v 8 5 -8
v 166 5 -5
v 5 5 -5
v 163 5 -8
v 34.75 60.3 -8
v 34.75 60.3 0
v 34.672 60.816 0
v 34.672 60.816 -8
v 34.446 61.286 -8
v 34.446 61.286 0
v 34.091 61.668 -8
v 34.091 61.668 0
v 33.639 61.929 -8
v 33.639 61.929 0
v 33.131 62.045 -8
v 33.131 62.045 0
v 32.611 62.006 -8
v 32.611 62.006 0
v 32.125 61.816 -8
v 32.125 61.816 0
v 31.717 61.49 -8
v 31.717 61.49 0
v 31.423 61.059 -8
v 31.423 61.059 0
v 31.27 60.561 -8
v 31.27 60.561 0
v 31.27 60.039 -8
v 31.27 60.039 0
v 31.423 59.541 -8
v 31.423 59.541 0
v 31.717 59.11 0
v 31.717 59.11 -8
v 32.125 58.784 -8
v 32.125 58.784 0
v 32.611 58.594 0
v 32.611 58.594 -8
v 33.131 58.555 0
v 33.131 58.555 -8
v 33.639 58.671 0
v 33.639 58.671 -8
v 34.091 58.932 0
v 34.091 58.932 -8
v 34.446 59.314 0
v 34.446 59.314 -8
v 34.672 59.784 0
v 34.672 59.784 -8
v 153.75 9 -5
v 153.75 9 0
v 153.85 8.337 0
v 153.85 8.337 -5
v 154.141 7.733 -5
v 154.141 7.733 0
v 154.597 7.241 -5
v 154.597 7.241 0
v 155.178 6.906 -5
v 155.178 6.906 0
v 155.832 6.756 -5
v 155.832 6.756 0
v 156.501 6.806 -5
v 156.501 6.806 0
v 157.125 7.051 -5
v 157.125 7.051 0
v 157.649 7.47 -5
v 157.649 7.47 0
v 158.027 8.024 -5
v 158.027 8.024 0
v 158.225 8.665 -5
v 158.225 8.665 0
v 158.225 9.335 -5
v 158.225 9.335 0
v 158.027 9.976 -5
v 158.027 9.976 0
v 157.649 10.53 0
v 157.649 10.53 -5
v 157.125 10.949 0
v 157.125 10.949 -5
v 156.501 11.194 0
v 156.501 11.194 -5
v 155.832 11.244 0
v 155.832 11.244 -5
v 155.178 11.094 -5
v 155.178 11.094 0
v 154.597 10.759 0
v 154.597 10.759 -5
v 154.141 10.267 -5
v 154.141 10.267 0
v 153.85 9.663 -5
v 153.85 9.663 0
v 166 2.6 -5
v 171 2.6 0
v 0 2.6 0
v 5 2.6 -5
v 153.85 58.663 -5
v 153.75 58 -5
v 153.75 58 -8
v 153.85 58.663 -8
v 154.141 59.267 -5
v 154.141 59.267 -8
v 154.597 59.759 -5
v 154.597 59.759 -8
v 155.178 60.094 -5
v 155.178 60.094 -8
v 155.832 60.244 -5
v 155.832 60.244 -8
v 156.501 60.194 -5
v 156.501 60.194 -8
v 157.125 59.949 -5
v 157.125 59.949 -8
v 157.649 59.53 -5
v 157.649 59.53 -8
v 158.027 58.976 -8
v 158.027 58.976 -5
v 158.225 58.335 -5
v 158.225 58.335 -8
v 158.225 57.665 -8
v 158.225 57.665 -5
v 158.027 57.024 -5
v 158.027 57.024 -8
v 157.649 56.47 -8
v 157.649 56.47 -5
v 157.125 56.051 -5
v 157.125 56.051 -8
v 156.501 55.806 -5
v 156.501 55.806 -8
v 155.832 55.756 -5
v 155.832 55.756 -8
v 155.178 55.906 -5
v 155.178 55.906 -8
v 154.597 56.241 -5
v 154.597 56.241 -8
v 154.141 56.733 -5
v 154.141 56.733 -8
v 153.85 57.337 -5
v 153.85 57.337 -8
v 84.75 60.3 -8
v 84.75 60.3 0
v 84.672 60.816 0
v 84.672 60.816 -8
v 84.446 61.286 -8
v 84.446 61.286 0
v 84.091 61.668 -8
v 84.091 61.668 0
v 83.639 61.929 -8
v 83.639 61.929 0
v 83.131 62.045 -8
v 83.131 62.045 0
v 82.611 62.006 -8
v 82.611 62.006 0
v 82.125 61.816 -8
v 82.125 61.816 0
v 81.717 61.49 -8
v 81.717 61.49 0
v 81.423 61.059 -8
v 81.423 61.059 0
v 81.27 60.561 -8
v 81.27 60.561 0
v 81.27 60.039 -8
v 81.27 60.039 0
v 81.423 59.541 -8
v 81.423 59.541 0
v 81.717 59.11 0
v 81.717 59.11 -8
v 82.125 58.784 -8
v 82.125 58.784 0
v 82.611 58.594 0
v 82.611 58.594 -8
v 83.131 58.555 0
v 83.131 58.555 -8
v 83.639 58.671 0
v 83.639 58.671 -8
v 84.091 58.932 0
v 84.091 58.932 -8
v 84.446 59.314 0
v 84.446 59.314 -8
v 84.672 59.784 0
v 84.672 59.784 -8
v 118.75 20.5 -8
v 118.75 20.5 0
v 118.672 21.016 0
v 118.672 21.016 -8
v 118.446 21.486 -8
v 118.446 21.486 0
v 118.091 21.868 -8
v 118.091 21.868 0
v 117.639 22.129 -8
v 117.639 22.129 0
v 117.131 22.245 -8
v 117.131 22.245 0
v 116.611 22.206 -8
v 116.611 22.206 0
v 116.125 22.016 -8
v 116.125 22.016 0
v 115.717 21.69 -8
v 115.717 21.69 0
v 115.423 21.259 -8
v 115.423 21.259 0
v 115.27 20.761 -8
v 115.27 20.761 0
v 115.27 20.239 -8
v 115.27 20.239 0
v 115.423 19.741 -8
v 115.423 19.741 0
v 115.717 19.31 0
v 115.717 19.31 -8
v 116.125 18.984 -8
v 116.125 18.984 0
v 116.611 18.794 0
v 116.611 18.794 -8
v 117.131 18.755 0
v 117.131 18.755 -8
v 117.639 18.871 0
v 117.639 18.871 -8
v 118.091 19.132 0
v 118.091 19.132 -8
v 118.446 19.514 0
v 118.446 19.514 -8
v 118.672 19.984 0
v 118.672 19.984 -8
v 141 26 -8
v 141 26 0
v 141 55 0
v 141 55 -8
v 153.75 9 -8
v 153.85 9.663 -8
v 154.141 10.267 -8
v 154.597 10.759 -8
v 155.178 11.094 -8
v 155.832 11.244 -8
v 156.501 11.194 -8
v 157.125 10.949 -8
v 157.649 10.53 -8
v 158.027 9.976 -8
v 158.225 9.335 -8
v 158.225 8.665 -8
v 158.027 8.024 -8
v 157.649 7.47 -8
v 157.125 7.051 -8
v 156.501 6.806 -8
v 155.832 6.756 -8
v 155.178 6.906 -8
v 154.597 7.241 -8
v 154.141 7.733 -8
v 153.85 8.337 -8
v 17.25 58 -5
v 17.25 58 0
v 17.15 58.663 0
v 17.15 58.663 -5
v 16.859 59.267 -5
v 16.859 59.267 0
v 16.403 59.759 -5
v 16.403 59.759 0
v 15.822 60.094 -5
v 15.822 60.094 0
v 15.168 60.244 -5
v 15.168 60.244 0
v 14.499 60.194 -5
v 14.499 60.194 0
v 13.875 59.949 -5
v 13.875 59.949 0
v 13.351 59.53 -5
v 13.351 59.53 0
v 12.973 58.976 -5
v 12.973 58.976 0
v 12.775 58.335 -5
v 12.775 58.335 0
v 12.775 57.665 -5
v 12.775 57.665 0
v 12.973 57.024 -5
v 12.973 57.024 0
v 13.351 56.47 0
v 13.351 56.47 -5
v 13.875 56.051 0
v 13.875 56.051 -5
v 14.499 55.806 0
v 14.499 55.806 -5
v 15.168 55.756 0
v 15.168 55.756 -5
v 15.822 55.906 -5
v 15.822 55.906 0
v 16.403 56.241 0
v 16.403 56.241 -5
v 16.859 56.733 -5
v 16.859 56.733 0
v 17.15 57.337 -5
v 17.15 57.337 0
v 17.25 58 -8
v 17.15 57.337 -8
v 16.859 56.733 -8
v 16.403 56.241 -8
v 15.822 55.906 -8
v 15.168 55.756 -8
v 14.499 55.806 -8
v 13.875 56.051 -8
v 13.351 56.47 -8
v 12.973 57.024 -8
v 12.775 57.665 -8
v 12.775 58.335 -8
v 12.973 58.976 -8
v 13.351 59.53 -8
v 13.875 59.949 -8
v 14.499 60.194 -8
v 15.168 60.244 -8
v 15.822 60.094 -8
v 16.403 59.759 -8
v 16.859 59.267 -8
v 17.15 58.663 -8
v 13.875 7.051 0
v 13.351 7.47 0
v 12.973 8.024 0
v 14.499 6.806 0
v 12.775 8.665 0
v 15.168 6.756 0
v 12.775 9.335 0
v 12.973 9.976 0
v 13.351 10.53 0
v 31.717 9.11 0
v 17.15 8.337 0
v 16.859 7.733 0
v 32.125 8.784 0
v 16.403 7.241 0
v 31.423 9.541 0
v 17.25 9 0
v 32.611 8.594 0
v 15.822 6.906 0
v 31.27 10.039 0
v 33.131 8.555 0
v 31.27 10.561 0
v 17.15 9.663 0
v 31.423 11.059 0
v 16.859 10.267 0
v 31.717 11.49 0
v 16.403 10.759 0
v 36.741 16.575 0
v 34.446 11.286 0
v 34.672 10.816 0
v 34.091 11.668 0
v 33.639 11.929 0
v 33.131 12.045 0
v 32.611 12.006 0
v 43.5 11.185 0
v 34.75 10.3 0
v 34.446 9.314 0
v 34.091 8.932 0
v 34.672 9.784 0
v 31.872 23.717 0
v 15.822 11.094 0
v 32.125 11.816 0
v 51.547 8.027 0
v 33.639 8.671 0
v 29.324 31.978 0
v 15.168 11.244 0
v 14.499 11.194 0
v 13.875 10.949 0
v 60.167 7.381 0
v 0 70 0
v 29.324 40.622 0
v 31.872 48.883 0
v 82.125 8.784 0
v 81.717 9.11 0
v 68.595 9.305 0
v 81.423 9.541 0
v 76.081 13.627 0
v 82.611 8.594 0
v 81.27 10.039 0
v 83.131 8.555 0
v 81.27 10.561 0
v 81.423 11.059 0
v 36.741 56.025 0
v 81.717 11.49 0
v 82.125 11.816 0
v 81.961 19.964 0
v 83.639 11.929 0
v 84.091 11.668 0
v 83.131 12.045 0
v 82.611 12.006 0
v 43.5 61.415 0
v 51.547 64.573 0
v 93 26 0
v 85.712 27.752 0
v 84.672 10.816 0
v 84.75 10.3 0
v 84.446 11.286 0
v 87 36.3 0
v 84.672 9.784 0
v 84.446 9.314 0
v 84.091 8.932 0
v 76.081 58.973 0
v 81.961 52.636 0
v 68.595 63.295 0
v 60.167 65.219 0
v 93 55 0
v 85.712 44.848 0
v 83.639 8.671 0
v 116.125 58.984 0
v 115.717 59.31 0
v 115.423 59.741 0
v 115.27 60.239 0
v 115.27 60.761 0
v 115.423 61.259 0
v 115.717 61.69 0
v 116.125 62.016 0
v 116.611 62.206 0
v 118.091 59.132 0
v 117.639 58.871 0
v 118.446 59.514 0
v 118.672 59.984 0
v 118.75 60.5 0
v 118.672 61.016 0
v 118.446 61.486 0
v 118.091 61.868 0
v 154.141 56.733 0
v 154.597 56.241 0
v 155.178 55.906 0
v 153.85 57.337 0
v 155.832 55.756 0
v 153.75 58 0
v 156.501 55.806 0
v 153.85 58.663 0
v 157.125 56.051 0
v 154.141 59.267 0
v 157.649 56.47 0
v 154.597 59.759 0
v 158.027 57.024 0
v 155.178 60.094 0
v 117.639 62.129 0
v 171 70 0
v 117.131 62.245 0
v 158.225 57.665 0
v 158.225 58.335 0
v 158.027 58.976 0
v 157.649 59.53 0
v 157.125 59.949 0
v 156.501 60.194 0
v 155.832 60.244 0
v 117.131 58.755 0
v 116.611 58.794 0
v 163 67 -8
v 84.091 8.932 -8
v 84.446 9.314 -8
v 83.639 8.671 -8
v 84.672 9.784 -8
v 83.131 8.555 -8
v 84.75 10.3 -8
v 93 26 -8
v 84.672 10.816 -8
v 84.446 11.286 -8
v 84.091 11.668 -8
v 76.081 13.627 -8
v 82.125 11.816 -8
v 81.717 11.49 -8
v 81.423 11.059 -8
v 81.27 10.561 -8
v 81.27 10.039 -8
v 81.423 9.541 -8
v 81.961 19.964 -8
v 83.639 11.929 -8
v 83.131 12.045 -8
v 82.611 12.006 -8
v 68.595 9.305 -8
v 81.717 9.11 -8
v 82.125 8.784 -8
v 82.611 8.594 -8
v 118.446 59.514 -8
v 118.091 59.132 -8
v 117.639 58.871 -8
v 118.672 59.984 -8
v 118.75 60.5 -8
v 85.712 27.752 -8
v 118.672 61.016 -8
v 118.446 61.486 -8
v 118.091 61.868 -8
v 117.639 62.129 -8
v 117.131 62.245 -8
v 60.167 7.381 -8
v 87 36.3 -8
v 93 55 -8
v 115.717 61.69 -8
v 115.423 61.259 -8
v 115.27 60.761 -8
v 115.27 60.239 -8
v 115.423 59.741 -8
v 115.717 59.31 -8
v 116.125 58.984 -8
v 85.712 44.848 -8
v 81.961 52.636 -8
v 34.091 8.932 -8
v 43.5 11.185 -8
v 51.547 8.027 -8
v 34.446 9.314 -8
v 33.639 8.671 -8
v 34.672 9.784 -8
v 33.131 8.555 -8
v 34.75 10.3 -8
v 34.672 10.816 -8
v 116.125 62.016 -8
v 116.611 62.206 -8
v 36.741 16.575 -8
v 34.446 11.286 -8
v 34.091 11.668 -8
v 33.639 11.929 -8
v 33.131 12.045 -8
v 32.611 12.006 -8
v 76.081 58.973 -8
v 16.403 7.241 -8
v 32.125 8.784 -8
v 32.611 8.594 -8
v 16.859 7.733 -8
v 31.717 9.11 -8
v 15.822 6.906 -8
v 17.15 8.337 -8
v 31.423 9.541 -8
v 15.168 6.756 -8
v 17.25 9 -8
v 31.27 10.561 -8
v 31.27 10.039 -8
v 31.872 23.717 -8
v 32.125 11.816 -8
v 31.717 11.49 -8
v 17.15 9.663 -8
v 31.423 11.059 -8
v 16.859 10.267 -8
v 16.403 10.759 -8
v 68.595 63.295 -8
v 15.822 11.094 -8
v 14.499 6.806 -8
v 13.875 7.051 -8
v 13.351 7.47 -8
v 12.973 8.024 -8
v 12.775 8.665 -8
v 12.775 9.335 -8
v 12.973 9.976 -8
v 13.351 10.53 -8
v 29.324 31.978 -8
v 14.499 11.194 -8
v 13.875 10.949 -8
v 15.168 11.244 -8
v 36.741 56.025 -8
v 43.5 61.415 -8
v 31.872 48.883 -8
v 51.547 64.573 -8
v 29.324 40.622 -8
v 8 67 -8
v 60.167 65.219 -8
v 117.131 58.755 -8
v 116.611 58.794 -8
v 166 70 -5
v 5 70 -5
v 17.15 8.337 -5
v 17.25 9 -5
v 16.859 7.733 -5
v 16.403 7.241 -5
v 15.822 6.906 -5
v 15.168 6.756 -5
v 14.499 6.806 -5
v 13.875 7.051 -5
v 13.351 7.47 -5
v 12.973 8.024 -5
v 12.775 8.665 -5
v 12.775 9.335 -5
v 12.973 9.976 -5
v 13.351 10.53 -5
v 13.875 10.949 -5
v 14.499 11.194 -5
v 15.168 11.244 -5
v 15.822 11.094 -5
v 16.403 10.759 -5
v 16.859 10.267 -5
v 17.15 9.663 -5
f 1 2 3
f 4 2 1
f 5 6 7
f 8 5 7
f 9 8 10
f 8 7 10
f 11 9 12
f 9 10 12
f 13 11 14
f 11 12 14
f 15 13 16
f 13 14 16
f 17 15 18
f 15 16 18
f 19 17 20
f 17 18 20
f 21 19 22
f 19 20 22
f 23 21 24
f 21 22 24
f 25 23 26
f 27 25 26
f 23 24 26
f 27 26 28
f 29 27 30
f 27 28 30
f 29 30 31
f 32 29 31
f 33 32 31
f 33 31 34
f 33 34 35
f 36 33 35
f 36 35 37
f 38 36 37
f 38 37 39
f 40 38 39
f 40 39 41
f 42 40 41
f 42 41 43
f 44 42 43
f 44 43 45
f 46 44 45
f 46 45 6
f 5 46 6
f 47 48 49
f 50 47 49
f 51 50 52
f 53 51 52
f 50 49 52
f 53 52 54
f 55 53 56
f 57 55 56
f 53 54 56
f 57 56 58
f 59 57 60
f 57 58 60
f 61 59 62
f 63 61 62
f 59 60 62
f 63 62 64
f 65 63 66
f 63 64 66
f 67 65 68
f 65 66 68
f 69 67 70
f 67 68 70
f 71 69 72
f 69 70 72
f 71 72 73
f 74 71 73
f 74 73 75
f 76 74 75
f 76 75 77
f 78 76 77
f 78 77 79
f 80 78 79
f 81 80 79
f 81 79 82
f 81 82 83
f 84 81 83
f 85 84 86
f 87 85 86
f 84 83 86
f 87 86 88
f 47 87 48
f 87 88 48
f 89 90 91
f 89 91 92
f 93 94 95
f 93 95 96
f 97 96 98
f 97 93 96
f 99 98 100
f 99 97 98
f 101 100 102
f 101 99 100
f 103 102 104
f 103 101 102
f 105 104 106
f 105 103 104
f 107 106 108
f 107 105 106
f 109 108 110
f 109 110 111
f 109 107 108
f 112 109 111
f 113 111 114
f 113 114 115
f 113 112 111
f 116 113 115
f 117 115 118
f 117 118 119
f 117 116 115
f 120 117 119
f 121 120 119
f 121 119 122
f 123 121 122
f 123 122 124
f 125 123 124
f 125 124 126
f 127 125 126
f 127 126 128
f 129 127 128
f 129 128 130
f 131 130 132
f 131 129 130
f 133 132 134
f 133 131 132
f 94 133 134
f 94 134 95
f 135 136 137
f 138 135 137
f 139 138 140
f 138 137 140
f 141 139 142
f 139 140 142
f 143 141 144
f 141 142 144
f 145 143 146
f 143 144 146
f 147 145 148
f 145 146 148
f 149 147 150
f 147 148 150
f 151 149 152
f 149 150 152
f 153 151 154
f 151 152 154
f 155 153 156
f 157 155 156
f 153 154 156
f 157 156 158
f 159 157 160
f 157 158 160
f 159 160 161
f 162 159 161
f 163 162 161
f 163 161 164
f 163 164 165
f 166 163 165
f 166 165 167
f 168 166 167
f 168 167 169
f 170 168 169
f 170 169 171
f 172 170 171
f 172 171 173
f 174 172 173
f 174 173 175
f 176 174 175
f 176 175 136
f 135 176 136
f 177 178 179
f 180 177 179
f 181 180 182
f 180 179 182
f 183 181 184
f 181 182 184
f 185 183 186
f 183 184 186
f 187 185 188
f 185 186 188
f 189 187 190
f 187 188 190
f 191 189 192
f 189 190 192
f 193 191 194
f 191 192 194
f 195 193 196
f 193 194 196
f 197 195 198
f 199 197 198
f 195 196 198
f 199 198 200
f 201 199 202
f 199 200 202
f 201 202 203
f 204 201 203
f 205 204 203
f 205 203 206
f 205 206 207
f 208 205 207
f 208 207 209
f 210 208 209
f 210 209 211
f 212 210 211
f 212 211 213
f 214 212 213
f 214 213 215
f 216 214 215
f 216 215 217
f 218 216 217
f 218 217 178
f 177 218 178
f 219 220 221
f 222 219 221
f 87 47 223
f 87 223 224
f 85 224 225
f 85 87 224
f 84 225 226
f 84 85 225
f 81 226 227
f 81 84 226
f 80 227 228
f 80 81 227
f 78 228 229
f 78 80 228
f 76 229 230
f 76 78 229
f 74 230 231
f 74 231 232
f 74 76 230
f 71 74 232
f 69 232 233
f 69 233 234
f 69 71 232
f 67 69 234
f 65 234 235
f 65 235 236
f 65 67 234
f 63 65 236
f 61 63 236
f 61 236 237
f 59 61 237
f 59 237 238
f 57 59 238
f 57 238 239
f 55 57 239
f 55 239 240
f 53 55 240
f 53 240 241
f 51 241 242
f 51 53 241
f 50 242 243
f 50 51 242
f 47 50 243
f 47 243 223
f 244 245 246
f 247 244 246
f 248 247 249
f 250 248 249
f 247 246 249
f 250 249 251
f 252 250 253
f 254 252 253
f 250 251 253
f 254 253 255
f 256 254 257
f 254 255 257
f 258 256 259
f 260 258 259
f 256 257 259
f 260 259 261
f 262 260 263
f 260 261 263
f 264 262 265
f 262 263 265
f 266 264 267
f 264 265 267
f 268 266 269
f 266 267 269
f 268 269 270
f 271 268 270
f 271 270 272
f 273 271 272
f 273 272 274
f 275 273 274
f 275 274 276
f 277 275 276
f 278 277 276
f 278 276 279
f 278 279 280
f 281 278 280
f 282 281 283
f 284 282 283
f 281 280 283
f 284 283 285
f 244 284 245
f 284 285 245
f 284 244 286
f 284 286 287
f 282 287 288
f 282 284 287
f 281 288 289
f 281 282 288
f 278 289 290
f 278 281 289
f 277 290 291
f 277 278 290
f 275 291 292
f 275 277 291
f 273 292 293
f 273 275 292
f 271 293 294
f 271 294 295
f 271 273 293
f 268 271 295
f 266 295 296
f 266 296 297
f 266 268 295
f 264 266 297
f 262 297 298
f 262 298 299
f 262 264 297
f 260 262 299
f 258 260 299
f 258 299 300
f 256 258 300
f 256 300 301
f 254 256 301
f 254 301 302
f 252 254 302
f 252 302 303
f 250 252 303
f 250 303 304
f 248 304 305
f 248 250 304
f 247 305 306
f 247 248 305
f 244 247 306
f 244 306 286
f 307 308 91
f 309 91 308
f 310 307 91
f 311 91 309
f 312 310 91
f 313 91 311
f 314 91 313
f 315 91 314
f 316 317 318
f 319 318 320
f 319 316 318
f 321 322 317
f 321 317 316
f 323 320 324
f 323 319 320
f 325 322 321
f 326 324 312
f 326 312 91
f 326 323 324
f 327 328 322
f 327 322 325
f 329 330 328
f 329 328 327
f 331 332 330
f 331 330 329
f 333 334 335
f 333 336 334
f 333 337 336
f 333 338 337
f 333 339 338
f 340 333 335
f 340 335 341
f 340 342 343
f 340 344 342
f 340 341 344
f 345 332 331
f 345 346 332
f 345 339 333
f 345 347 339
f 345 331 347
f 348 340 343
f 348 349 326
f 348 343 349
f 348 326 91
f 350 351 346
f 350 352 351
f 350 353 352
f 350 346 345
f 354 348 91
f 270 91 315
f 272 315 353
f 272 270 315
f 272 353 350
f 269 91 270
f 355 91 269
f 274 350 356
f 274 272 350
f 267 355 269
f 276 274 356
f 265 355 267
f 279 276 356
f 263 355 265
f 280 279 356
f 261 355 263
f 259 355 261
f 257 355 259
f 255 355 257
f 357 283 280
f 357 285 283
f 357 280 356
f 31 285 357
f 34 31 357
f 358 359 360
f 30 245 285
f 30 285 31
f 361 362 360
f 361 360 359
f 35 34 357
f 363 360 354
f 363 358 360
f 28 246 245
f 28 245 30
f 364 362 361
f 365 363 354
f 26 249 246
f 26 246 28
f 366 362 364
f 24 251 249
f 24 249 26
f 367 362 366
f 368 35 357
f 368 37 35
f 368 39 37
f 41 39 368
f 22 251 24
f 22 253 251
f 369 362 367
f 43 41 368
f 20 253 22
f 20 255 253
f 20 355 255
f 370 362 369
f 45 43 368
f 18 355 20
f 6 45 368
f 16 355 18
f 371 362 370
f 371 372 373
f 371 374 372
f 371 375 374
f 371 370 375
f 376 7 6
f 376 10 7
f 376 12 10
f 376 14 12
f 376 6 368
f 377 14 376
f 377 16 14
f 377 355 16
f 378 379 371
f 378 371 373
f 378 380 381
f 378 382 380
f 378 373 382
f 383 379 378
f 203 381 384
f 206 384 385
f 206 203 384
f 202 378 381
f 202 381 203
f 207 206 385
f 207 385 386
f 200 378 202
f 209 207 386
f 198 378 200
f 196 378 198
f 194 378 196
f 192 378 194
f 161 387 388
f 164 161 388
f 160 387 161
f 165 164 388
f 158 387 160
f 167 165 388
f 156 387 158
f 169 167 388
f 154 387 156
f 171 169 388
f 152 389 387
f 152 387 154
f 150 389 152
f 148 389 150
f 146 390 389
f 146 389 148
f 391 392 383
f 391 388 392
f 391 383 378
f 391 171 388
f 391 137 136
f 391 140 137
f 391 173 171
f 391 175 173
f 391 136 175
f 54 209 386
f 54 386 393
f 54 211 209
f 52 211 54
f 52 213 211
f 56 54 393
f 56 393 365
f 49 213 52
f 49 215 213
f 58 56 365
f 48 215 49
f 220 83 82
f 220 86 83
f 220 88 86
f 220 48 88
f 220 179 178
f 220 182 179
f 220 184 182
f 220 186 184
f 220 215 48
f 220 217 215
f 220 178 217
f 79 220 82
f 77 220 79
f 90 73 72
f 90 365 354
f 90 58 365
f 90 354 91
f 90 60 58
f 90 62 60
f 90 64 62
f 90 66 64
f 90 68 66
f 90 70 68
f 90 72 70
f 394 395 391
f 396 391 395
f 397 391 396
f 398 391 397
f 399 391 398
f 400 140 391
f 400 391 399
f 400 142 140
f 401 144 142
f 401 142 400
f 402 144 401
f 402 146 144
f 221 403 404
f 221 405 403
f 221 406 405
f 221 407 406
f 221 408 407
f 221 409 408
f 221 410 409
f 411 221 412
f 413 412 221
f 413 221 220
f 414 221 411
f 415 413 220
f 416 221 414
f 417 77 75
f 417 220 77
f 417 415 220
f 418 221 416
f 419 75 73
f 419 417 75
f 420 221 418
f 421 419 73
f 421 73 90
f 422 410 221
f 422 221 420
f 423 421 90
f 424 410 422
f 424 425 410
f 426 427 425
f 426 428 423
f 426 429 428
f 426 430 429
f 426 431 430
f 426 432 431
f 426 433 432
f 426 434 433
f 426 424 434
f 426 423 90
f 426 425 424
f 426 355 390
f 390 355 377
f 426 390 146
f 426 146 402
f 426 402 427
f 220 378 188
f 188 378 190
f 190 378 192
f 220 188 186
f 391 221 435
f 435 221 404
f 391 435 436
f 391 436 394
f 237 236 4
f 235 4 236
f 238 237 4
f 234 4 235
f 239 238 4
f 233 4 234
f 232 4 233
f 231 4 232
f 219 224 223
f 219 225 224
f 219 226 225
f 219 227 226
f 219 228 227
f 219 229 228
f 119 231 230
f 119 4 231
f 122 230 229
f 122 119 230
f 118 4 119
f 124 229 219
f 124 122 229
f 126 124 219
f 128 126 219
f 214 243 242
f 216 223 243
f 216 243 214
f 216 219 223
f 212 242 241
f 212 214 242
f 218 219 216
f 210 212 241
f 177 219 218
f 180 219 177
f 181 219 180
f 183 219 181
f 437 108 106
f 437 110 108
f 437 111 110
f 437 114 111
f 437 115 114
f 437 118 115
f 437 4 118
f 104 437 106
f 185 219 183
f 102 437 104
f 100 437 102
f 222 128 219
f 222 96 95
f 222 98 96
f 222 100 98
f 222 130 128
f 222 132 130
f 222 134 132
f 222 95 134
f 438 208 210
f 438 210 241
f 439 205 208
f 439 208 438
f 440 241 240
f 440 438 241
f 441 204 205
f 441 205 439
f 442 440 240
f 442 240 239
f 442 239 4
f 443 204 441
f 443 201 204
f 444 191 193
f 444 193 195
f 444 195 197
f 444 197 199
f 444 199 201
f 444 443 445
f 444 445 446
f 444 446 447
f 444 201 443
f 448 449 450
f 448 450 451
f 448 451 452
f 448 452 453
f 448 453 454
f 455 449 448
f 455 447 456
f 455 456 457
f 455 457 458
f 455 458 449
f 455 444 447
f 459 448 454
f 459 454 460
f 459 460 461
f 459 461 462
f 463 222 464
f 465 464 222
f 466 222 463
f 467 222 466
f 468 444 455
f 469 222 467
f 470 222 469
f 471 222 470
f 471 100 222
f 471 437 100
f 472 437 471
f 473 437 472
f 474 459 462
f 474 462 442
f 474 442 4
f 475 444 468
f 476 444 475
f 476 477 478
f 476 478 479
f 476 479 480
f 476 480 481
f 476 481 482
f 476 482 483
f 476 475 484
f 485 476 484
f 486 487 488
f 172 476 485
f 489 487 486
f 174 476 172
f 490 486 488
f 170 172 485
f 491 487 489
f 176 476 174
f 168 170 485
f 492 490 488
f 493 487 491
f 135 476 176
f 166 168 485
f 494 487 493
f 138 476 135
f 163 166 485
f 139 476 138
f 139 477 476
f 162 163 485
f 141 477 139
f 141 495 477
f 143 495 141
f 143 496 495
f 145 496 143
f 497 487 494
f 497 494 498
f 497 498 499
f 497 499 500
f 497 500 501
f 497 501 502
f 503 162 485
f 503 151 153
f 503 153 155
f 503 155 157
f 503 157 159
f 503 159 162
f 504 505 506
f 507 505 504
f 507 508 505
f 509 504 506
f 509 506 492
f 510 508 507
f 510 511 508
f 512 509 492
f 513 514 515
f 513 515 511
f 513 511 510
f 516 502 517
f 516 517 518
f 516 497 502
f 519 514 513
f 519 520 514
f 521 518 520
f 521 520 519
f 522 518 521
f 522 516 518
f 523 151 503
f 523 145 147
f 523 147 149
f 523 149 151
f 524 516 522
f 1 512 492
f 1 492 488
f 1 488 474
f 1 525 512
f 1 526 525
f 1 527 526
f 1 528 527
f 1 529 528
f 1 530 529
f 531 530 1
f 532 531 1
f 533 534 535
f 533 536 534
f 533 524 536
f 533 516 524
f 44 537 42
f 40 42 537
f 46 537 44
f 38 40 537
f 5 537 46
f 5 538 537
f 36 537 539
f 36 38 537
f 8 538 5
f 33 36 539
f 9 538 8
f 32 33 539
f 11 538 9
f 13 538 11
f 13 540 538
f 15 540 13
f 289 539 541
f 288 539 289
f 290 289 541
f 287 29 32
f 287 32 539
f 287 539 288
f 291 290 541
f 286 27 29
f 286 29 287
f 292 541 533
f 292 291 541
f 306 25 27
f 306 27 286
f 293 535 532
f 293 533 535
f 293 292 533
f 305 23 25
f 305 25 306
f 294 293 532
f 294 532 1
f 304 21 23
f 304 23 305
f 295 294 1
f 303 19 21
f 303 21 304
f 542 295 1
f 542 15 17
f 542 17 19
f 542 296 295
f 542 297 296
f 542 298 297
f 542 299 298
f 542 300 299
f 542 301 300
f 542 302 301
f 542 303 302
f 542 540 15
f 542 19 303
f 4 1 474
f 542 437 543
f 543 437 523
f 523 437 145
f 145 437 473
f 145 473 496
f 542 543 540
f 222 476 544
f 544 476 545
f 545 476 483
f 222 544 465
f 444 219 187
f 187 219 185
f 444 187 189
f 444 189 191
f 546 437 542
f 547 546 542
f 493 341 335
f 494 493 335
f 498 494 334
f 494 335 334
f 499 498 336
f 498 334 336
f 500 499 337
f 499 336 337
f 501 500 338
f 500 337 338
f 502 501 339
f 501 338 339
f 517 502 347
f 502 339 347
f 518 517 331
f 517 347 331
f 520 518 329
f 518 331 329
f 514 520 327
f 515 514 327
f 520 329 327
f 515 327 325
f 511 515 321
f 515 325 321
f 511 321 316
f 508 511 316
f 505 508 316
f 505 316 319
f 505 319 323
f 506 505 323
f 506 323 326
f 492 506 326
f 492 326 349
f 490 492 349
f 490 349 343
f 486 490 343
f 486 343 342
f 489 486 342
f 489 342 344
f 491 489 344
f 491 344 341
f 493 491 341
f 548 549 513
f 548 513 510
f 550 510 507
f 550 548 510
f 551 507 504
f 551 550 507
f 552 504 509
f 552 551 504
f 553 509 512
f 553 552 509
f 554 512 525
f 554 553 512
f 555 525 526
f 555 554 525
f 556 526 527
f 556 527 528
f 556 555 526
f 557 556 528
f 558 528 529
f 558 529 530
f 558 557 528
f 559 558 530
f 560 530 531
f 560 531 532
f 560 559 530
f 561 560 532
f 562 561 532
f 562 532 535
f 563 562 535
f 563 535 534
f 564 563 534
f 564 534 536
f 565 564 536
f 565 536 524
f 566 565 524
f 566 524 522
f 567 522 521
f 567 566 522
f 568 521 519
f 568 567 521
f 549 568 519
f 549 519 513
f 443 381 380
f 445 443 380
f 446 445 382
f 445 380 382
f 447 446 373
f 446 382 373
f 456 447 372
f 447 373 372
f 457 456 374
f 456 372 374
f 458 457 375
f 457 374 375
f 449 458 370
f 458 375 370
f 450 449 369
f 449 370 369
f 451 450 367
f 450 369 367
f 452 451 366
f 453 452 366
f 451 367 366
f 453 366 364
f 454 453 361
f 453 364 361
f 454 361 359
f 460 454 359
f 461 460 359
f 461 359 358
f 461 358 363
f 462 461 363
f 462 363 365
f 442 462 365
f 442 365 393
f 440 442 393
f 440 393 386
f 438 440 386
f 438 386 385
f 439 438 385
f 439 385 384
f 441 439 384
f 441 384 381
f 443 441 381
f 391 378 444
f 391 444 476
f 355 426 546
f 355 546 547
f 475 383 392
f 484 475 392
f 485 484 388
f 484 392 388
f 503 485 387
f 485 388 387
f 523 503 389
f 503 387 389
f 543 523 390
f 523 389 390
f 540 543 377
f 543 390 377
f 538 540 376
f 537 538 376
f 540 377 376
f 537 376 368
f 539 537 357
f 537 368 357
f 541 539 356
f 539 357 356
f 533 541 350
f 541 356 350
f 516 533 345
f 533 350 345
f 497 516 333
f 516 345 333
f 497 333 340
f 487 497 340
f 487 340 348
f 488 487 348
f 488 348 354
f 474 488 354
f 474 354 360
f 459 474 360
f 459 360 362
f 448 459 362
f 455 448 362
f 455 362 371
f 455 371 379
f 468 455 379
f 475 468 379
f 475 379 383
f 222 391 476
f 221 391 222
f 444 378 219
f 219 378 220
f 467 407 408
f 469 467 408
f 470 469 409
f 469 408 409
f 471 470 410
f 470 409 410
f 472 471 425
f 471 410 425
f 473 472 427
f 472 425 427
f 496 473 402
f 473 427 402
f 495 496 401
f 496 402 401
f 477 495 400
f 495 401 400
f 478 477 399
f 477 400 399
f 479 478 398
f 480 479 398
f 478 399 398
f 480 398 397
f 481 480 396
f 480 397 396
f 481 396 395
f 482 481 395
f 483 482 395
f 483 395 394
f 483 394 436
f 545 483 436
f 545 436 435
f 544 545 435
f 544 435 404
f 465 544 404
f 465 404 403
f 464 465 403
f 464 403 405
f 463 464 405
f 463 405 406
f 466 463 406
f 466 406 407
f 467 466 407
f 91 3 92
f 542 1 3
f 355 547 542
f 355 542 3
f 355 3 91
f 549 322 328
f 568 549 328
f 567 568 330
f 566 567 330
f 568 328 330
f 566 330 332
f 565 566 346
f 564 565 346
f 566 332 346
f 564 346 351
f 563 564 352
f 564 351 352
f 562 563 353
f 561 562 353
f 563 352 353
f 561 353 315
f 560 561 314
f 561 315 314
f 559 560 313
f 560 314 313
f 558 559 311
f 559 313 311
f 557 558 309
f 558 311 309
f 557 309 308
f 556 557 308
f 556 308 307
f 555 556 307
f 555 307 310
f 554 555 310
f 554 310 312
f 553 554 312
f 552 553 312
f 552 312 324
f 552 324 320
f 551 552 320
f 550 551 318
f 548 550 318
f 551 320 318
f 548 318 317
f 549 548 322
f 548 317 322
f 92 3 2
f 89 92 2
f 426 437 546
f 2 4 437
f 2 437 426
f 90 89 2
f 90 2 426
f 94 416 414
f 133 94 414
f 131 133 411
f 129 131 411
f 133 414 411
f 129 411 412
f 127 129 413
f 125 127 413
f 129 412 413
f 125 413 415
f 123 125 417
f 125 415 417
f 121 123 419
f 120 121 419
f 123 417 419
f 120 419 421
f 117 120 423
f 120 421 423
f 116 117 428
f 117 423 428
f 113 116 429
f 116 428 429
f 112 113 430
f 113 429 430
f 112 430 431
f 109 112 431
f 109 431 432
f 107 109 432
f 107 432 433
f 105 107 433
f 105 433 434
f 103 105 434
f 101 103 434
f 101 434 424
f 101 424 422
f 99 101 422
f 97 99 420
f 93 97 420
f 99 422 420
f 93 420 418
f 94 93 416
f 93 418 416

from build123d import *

# Parameters (mm, degrees)
SKETCH1_W           = 171
SKETCH1_H           = 70
SKETCH1_R           = 2.25
BOSS_EXTRUDE1_DEPTH = 5
SKETCH2_W           = 171
SKETCH2_H           = 65
SKETCH2_R           = 2.25
BOSS_EXTRUDE2_DEPTH = 3
CHAMFER1_SIZE       = 8
CHAMFER3_SIZE       = 3
SKETCH3_W           = 7.071067812
SKETCH3_H           = 2.6
CUT_EXTRUDE1_DEPTH  = 199.002168661
SKETCH4_R           = 29
SKETCH4_R_2         = 1.75
SKETCH4_W           = 48
SKETCH4_H           = 29
CUT_EXTRUDE2_DEPTH  = 185.945938047


with BuildPart() as part:
    # Sketch1 → Boss-Extrude1 (new body)
    with BuildSketch(Plane.XY):
        with Locations((85.5, 35)):
            Rectangle(SKETCH1_W, SKETCH1_H)
        with Locations((15, 9)):
            Circle(SKETCH1_R, mode=Mode.SUBTRACT)
        with Locations(Location((156, 9, 0), (0, 0, 180))):
            Circle(SKETCH1_R, mode=Mode.SUBTRACT)
        with Locations((15, 58)):
            Circle(SKETCH1_R, mode=Mode.SUBTRACT)
        with Locations(Location((156, 58, 0), (0, 0, 180))):
            Circle(SKETCH1_R, mode=Mode.SUBTRACT)
    extrude(amount=-BOSS_EXTRUDE1_DEPTH)

    # Sketch2 → Boss-Extrude2 (add)
    with BuildSketch(Plane(origin=(0, 0, -5), x_dir=(-1, 0, 0), z_dir=(0, 0, -1))):
        with Locations((-85.5, 37.5)):
            Rectangle(SKETCH2_W, SKETCH2_H)
        with Locations(Location((-15, 9, 0), (0, 0, 180))):
            Circle(SKETCH2_R, mode=Mode.SUBTRACT)
        with Locations((-156, 9)):
            Circle(SKETCH2_R, mode=Mode.SUBTRACT)
        with Locations(Location((-15, 58, 0), (0, 0, 180))):
            Circle(SKETCH2_R, mode=Mode.SUBTRACT)
        with Locations((-156, 58)):
            Circle(SKETCH2_R, mode=Mode.SUBTRACT)
    extrude(amount=BOSS_EXTRUDE2_DEPTH)

    # Chamfer1
    # the kernel refuses this chamfer: 8 mm, written as the material it takes off along each edge
    with BuildSketch(Plane(origin=(171, -15.573463904, -8), x_dir=(-0.9996219169112968, 0, -0.027495876610586296), z_dir=(0, 1, 0)), Plane(origin=(0, 90.573463904, -8), x_dir=(0.9996219169112968, 0, -0.027495876610586275), z_dir=(0, -1, 0))) as chamfer1_piece_1:
        Polygon((CHAMFER1_SIZE * 0.999621916911, CHAMFER1_SIZE * 0.0274958766106), (-CHAMFER1_SIZE * 0.0274958766106, CHAMFER1_SIZE * 0.999621916911), (0, 0), align=None)
    extrude(amount=106.146927807, mode=Mode.SUBTRACT)

    # Chamfer3
    chamfer3_edges = [part.edges().sort_by_distance(p)[0] for p in [
        (85.5, 70, -8),
    ]]
    chamfer(chamfer3_edges, length=CHAMFER3_SIZE)

    # Sketch3 → Cut-Extrude1 (cut, through all, along a direction that is not the sketch's normal)
    with BuildSketch(Plane(origin=(85.5, 0, -85.5), x_dir=(-0.7071067811865452, 0, -0.7071067811865498), z_dir=(0.7071067811865498, 0, -0.7071067811865452))):
        with Locations((-117.379725677, 1.3)):
            Rectangle(SKETCH3_W, SKETCH3_H)
    extrude(amount=-CUT_EXTRUDE1_DEPTH, dir=(1, 0, 0), mode=Mode.SUBTRACT)

    # Sketch4 → Cut-Extrude2 (cut, through all)
    with BuildSketch(Plane.XY):
        with Locations((58, 36.3)):
            Circle(SKETCH4_R)
        with Locations((33, 60.3)):
            Circle(SKETCH4_R_2)
        with Locations((83, 60.3)):
            Circle(SKETCH4_R_2)
        with Locations((83, 10.3)):
            Circle(SKETCH4_R_2)
        with Locations((33, 10.3)):
            Circle(SKETCH4_R_2)
        with Locations((117, 60.5)):
            Circle(SKETCH4_R_2)
        with Locations((117, 20.5)):
            Circle(SKETCH4_R_2)
        with Locations((117, 40.5)):
            Rectangle(SKETCH4_W, SKETCH4_H)
    extrude(amount=-CUT_EXTRUDE2_DEPTH, mode=Mode.SUBTRACT)


solid = part.part
